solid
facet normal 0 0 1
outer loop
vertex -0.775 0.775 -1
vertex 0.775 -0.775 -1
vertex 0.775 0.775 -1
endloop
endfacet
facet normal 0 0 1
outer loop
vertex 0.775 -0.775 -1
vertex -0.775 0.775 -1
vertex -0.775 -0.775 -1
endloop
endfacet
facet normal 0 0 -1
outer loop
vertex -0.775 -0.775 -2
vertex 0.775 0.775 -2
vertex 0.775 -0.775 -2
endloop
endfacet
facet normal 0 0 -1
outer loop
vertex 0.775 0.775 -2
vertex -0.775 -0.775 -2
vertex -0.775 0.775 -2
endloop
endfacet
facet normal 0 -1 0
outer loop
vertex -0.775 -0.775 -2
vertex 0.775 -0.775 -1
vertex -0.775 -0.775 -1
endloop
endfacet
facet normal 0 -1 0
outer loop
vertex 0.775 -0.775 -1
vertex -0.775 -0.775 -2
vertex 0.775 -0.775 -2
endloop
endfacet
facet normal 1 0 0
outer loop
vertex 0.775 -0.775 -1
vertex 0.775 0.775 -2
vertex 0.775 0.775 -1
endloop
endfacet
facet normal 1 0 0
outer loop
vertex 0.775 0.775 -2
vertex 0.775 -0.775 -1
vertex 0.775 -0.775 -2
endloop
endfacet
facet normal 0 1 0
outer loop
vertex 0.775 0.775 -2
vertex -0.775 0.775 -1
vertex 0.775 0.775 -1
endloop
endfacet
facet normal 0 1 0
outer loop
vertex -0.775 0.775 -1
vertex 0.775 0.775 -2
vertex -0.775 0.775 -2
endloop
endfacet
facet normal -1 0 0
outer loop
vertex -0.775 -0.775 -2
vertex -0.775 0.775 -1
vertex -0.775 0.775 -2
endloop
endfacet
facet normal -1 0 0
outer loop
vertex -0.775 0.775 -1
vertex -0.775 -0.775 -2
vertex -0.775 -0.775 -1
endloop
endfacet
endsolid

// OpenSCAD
// file: config.scad
file="../CCS811_Air_Quality_Breakout/Hardware/CSS811_CO2_TVOC_Breakout.dxf";

$fn=360;
convexity=1;

pcb_height=0.6;
text_height=0.0001;
pad_height=0.01;

pin_height=8;
pin_top=1.5;
pin_plastic_height=2;
pin_plastic_radius=1.55;
min_pin_radius = 0.3;

layer_outline=20;
layer_place_top=21;
layer_place_bottom=22;
layer_stop_top=29;
layer_stop_bottom=30;

layer_drill=44;

color_pcb="firebrick";
color_place="white";
color_pad="gold";
color_pin="silver";
color_pin_plastic="dimgrey";
// main file
include <config.scad>

color(color_pin_plastic) translate([0,0,-pin_plastic_height*3/4]) {
    minkowski() {
        linear_extrude(height=pin_plastic_height/2, center=false, convexity=convexity) {
            offset(min_pin_radius) offset(-min_pin_radius) { // Removed small pins
                import (file=file, layer=layer_drill);
            }
        }
        cube([pin_plastic_radius, pin_plastic_radius, pin_plastic_height/2], center=true);

    }
}
